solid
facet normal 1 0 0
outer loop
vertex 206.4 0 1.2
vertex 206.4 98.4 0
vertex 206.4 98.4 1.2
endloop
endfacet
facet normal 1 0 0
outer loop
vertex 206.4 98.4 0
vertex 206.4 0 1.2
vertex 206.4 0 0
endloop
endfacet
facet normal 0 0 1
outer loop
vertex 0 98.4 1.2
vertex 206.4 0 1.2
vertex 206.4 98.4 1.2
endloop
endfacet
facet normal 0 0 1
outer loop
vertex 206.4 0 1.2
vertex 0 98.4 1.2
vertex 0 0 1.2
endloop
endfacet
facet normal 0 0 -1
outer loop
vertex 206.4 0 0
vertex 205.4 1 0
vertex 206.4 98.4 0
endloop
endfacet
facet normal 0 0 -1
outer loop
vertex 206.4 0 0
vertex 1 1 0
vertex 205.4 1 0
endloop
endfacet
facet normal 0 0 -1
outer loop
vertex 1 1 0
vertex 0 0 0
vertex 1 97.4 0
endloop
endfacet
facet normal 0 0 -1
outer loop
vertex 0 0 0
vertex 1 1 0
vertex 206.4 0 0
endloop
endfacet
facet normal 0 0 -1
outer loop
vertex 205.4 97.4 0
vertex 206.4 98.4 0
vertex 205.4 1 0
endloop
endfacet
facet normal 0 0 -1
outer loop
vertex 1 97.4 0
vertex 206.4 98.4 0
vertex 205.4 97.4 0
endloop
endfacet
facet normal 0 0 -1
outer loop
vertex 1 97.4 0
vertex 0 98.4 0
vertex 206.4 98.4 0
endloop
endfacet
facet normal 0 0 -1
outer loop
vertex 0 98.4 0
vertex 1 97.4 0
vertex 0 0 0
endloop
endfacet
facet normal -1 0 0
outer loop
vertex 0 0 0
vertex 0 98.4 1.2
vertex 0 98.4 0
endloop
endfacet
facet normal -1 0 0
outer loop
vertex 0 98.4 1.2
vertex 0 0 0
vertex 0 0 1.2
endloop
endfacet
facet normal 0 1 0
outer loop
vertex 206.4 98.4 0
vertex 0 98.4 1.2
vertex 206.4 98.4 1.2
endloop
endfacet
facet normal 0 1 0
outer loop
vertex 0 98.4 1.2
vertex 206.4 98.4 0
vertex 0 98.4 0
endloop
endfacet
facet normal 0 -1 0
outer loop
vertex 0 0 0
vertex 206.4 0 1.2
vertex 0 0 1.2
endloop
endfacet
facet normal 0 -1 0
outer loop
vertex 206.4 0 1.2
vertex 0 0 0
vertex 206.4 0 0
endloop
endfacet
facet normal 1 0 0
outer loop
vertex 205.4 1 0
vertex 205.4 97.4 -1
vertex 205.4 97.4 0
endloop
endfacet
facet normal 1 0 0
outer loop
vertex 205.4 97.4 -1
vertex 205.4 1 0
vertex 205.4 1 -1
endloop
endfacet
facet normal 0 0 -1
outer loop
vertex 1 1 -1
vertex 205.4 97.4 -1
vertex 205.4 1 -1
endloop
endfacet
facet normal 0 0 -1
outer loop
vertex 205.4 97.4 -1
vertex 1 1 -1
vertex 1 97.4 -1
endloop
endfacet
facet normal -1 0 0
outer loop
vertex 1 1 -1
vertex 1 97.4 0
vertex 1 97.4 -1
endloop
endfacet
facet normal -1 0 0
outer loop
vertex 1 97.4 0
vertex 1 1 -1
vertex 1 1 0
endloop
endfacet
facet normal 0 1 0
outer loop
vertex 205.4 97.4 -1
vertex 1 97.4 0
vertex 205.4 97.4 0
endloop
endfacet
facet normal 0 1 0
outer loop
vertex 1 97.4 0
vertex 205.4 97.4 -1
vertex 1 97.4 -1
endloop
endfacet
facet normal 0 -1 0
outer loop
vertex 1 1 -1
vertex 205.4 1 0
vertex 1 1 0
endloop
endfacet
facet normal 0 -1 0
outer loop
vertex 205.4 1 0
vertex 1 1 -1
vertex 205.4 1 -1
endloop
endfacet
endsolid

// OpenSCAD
// ============================================================
// Base Compartment Lid - sits on top of open-front, open-top base
// ============================================================
include <common.scad>

module base_lid() {
    lid_w = cavity_w - 2 * base_wall - 2 * tol;
    lid_h = stand_foot_depth - base_wall - 2 * tol;
    lid_d = 1.2;
    lip = 1.0;

//    difference() {
        union() {
            cube([lid_w, lid_h, lid_d]);
            translate([lip, lip, -lip])
                cube([lid_w - 2 * lip, lid_h - 2 * lip, lip]);
        }

//        // Finger pull cutout
//        translate([lid_w / 2, lid_h / 2, -lip])
//            cylinder(d = 15, h = lid_d + lip, $fn = 30);
//    }
}

base_lid();
